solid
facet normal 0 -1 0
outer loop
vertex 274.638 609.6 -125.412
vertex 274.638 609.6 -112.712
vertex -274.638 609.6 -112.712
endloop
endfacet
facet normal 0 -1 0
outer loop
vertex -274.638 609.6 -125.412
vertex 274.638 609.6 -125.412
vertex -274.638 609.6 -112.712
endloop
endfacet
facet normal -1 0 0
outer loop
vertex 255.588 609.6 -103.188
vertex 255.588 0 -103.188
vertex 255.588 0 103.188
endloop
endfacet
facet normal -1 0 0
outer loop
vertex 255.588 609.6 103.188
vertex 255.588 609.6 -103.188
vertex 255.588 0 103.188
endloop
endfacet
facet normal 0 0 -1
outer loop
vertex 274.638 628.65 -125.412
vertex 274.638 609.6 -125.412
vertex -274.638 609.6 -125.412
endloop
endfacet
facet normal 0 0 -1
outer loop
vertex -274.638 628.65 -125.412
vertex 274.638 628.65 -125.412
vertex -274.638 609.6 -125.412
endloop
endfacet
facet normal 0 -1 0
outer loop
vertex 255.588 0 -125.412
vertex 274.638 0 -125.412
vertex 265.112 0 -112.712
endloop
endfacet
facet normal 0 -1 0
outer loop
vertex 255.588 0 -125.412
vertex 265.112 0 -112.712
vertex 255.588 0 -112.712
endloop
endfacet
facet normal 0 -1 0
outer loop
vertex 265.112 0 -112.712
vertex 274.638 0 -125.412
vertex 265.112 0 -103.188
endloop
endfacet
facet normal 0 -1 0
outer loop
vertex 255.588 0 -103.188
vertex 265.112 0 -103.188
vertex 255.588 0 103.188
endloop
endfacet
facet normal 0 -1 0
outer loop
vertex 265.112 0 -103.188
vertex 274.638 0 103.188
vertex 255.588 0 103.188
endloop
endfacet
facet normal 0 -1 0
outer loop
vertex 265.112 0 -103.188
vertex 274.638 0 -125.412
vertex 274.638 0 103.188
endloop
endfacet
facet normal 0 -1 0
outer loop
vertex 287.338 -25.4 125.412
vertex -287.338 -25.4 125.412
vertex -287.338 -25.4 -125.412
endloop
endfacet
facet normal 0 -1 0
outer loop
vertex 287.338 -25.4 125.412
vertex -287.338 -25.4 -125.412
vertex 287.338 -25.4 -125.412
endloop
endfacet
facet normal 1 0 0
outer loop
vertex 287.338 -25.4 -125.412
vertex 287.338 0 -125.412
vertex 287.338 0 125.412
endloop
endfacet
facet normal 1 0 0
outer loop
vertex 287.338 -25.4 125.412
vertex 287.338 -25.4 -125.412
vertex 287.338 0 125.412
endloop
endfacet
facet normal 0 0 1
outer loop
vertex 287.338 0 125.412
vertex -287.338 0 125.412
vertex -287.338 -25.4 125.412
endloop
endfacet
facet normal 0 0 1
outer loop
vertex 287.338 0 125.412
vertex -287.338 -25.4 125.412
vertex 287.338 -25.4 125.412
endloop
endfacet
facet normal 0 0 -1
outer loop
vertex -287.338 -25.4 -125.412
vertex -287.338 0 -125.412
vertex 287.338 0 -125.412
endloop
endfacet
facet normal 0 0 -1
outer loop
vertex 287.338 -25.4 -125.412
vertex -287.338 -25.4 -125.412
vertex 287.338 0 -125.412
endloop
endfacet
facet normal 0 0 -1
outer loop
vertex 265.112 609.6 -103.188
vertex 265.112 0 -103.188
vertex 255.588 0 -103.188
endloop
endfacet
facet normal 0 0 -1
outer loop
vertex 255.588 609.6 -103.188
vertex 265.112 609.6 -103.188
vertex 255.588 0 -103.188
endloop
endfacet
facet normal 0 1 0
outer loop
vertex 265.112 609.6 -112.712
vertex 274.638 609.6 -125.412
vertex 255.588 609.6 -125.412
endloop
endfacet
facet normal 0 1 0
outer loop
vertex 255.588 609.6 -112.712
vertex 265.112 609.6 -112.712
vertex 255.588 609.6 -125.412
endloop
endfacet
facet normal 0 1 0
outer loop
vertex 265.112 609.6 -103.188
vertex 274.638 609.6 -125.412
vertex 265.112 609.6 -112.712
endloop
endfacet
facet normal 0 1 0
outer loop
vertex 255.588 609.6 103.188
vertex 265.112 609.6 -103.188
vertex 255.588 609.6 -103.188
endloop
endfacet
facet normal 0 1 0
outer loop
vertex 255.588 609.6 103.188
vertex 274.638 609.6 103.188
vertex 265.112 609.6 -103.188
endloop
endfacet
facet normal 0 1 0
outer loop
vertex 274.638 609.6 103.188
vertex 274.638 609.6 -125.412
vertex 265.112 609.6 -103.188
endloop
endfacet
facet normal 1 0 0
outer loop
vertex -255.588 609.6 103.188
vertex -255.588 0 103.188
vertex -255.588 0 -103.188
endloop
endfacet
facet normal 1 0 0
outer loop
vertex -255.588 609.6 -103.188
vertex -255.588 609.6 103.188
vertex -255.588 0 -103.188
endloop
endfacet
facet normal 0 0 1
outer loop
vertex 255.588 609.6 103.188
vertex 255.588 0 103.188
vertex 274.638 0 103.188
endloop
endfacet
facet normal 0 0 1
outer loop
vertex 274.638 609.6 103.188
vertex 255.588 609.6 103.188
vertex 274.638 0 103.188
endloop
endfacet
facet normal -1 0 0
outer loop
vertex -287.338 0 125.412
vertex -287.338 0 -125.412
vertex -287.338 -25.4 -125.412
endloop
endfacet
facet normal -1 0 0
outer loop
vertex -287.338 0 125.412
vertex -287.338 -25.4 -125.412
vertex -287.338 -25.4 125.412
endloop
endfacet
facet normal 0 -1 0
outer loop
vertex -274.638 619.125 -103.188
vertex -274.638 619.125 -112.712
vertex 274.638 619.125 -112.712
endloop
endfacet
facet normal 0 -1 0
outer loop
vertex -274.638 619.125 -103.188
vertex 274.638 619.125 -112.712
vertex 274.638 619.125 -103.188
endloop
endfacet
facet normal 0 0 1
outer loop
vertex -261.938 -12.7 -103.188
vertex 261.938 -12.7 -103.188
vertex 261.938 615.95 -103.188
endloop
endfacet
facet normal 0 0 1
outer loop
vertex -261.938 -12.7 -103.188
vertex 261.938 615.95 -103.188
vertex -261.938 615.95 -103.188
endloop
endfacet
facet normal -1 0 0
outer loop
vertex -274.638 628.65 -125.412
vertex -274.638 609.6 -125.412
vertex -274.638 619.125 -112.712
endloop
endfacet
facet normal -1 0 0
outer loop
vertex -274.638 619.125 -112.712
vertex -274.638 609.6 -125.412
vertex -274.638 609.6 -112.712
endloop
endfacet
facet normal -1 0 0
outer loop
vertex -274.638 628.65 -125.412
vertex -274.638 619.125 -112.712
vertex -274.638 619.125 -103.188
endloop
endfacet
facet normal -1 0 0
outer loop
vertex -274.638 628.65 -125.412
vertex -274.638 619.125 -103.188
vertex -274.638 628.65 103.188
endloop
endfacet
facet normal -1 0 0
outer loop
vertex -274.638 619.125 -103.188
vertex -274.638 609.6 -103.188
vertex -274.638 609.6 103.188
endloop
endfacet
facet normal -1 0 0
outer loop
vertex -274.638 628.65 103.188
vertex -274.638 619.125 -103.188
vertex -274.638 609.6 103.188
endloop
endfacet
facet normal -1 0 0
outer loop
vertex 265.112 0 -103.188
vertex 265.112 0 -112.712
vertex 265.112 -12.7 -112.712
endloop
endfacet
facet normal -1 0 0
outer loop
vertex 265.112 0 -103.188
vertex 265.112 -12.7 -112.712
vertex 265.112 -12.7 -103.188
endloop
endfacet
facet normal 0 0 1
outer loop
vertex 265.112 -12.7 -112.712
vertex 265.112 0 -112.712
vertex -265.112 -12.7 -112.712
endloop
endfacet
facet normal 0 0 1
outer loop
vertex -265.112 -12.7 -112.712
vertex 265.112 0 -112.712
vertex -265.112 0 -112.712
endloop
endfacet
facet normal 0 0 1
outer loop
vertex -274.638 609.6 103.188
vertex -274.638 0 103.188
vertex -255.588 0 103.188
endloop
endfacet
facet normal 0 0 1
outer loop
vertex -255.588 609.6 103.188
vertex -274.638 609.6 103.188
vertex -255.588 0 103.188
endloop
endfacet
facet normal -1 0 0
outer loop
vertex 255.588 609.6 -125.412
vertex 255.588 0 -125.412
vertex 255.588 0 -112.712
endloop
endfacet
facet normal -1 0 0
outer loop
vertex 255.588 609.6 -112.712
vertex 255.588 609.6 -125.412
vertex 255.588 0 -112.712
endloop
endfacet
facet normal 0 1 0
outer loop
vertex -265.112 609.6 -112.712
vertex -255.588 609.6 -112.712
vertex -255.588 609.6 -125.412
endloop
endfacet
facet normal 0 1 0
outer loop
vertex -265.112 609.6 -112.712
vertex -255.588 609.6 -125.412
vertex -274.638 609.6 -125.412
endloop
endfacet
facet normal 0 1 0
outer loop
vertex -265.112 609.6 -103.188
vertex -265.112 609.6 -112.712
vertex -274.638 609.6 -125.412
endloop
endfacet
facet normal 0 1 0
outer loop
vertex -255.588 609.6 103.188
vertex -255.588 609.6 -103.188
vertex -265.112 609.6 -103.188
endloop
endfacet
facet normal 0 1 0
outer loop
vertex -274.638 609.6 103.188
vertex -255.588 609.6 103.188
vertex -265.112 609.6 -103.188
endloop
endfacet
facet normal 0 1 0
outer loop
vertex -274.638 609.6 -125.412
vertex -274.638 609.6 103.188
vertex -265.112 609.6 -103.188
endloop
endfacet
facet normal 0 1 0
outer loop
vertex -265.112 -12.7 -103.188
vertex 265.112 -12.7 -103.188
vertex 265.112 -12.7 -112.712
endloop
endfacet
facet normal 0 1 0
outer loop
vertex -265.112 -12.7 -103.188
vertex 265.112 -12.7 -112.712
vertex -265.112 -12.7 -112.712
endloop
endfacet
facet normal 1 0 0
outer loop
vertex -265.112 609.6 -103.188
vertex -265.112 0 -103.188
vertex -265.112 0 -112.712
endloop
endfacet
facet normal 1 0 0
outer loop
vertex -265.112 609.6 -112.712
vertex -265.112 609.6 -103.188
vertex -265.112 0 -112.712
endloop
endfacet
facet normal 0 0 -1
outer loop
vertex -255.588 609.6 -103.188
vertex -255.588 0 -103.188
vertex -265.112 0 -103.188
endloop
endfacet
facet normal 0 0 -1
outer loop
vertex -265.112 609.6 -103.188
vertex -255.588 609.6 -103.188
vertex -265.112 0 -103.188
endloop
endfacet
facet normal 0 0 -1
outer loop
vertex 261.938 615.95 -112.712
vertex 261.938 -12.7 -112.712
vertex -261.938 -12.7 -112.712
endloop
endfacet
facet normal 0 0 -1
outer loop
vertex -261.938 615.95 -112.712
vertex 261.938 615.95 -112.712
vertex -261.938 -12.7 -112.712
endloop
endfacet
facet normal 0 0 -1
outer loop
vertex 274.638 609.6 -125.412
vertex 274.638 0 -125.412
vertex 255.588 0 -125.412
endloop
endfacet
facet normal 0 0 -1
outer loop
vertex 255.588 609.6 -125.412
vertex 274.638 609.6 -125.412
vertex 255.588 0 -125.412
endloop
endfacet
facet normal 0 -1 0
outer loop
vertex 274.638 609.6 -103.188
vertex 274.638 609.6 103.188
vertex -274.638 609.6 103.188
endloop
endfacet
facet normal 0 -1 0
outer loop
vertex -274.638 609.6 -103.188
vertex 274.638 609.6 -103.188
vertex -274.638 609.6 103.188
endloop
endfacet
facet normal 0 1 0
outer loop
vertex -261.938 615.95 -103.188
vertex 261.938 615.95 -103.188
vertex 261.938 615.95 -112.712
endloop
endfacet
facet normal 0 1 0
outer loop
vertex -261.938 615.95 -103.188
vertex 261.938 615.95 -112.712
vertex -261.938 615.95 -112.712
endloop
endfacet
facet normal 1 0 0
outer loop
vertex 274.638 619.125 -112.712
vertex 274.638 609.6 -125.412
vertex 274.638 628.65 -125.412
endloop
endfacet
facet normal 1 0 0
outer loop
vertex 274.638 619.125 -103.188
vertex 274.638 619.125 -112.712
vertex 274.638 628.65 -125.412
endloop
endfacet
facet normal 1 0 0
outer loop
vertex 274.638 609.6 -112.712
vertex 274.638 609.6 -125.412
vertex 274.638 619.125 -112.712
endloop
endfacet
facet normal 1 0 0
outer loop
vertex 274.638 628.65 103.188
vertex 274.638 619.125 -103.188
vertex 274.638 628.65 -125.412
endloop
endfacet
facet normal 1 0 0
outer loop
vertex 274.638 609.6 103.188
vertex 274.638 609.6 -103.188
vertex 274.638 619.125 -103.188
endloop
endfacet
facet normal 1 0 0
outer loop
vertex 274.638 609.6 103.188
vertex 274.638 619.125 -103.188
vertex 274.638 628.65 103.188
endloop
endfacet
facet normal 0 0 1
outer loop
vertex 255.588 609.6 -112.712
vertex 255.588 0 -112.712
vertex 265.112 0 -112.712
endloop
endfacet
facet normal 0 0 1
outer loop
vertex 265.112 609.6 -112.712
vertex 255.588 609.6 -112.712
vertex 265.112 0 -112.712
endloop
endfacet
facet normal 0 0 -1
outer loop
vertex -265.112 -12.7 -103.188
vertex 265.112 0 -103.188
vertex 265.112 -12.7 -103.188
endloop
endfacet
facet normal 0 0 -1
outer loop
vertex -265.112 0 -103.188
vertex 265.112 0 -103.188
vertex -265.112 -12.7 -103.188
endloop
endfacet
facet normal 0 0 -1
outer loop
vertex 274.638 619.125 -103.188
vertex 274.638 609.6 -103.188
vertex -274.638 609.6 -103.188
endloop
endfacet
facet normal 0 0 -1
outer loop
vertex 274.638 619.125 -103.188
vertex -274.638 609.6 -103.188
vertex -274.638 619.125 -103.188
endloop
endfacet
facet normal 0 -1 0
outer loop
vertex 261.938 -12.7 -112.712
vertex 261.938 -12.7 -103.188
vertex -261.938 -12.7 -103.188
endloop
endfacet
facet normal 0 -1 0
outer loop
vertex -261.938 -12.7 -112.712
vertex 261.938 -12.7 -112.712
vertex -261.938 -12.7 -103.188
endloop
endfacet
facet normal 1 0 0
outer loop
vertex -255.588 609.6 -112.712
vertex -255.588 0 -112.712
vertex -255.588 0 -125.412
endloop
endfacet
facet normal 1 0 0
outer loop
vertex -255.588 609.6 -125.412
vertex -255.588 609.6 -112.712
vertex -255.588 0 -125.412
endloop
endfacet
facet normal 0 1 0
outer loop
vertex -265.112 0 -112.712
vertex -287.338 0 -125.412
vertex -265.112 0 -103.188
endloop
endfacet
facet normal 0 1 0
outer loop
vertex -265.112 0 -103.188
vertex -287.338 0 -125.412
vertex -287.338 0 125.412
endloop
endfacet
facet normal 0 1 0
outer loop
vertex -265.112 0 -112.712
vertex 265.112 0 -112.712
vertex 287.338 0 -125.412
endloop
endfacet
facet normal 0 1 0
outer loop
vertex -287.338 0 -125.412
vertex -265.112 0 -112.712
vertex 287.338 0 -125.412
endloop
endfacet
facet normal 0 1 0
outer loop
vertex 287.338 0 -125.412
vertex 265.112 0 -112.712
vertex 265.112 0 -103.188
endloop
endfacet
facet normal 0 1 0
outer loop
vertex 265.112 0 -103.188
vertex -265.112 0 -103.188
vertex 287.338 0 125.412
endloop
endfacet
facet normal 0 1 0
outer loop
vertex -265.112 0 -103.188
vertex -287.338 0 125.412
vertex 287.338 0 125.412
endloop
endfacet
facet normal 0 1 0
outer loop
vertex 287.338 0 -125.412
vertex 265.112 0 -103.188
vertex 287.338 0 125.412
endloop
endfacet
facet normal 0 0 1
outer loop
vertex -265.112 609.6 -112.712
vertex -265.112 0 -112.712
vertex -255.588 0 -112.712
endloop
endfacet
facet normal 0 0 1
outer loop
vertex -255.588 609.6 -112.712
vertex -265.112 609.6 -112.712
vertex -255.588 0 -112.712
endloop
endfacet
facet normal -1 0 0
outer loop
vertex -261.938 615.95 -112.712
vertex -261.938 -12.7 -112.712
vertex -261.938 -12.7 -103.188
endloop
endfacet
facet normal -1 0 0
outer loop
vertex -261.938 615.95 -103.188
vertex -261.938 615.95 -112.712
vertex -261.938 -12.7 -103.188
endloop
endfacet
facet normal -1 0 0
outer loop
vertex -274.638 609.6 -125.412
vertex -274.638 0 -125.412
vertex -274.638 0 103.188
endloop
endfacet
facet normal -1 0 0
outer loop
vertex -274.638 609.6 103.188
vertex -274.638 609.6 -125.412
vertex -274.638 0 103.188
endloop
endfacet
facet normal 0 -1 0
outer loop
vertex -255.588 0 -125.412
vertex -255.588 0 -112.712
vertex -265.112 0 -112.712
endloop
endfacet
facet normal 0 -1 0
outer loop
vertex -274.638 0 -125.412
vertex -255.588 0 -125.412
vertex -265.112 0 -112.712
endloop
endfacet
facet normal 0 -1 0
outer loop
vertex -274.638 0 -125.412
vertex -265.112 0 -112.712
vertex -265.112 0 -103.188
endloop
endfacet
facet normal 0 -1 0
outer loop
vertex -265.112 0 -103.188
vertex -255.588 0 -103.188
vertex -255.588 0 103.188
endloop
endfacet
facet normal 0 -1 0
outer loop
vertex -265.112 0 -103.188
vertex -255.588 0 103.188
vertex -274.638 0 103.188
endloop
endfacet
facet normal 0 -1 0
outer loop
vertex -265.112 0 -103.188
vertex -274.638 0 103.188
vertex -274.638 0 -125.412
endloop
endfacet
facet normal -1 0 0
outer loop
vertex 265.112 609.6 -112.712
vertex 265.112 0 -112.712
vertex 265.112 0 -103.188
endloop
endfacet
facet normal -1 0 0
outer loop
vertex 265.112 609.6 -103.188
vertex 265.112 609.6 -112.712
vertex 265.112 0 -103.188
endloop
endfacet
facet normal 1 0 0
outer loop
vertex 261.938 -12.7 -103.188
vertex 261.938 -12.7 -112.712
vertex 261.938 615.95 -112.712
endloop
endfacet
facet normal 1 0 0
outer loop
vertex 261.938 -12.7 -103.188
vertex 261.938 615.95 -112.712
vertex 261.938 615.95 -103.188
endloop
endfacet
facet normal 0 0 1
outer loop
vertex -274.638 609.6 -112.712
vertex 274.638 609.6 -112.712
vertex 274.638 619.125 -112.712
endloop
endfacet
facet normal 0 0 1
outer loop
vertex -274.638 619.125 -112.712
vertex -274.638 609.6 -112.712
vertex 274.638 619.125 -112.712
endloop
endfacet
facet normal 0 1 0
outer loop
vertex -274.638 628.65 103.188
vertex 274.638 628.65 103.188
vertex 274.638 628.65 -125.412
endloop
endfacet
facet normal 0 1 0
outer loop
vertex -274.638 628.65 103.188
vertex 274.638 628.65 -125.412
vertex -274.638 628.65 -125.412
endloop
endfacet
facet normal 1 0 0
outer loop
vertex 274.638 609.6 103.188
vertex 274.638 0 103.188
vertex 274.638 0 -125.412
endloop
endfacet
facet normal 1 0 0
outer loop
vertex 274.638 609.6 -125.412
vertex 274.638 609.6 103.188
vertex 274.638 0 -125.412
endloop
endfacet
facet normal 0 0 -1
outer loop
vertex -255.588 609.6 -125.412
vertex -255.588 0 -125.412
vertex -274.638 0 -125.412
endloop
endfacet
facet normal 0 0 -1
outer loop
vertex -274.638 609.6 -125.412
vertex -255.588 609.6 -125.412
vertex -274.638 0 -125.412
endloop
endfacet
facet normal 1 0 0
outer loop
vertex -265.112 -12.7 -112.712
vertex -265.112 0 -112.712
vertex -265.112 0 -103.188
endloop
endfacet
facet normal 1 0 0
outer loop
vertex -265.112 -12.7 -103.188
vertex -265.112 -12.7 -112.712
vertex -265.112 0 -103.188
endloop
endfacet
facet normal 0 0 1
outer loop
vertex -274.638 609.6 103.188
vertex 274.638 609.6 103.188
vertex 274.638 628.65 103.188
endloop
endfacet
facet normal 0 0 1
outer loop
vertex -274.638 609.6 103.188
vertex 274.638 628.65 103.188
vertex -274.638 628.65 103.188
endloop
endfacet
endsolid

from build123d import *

# Parameters (mm, degrees)
F0_W      = 574.675
F0_H      = 250.825
F1_DEPTH  = 25.4
F3_DEPTH  = 609.6
F4_W      = 530.225
F4_H      = 9.525
F5_DEPTH  = 12.7
F6_W      = 523.875
F6_H      = 9.525
F7_DEPTH  = 628.65
F8_W      = 549.275
F8_H      = 228.6
F9_DEPTH  = 19.05
F10_W     = 9.525
F10_H     = 9.525
F11_DEPTH = 584.2


with BuildPart() as f1:
    # F0 (on Front) → F1 (new body)
    with BuildSketch(Plane.XZ):
        Rectangle(F0_W, F0_H)
    extrude(amount=F1_DEPTH)

    # F4 (on face) → F5 (cut)
    with BuildSketch(Plane(origin=(0, 0, 0), x_dir=(-1, 0, 0), z_dir=(0, 1, 0))):
        with Locations((0, -107.95)):
            Rectangle(F4_W, F4_H)
    extrude(amount=-F5_DEPTH, mode=Mode.SUBTRACT)


with BuildPart() as f3:
    # F2 (on face) → F3 (new body)
    with BuildSketch(Plane(origin=(0, 0, 0), x_dir=(-1, 0, 0), z_dir=(0, 1, 0))):
        Polygon((-255.5875, 103.1875), (-274.6375, 103.1875), (-274.6375, -125.4125), (-255.5875, -125.4125), (-255.5875, -112.7125), (-265.1125, -112.7125), (-265.1125, -103.1875), (-255.5875, -103.1875), align=None)
    extrude(amount=F3_DEPTH)


with BuildPart() as f3b:
    # F2 (on face) → F3, piece 2 (new body)
    with BuildSketch(Plane(origin=(0, 0, 0), x_dir=(-1, 0, 0), z_dir=(0, 1, 0))):
        Polygon((274.6375, -125.4125), (274.6375, 103.1875), (255.5875, 103.1875), (255.5875, -103.1875), (265.1125, -103.1875), (265.1125, -112.7125), (255.5875, -112.7125), (255.5875, -125.4125), align=None)
    extrude(amount=F3_DEPTH)


with BuildPart() as f7:
    # F6 (on face) → F7 (new body)
    with BuildSketch(Plane(origin=(0, -12.7, 0), x_dir=(-1, 0, 0), z_dir=(0, 1, 0))):
        with Locations((0, -107.95)):
            Rectangle(F6_W, F6_H)
    extrude(amount=F7_DEPTH)


with BuildPart() as f9:
    # F8 (on face) → F9 (new body)
    with BuildSketch(Plane(origin=(0, 609.6, 0), x_dir=(-1, 0, 0), z_dir=(0, 1, 0))):
        with Locations((0, -11.1125)):
            Rectangle(F8_W, F8_H)
    extrude(amount=F9_DEPTH)

    # F10 (on face) → F11 (cut)
    with BuildSketch(Plane.YZ.offset(274.6375)):
        with Locations((614.3625, -107.95)):
            Rectangle(F10_W, F10_H)
    extrude(amount=-F11_DEPTH, mode=Mode.SUBTRACT)


solid = Compound([f1.part, f3.part, f3b.part, f7.part, f9.part])
